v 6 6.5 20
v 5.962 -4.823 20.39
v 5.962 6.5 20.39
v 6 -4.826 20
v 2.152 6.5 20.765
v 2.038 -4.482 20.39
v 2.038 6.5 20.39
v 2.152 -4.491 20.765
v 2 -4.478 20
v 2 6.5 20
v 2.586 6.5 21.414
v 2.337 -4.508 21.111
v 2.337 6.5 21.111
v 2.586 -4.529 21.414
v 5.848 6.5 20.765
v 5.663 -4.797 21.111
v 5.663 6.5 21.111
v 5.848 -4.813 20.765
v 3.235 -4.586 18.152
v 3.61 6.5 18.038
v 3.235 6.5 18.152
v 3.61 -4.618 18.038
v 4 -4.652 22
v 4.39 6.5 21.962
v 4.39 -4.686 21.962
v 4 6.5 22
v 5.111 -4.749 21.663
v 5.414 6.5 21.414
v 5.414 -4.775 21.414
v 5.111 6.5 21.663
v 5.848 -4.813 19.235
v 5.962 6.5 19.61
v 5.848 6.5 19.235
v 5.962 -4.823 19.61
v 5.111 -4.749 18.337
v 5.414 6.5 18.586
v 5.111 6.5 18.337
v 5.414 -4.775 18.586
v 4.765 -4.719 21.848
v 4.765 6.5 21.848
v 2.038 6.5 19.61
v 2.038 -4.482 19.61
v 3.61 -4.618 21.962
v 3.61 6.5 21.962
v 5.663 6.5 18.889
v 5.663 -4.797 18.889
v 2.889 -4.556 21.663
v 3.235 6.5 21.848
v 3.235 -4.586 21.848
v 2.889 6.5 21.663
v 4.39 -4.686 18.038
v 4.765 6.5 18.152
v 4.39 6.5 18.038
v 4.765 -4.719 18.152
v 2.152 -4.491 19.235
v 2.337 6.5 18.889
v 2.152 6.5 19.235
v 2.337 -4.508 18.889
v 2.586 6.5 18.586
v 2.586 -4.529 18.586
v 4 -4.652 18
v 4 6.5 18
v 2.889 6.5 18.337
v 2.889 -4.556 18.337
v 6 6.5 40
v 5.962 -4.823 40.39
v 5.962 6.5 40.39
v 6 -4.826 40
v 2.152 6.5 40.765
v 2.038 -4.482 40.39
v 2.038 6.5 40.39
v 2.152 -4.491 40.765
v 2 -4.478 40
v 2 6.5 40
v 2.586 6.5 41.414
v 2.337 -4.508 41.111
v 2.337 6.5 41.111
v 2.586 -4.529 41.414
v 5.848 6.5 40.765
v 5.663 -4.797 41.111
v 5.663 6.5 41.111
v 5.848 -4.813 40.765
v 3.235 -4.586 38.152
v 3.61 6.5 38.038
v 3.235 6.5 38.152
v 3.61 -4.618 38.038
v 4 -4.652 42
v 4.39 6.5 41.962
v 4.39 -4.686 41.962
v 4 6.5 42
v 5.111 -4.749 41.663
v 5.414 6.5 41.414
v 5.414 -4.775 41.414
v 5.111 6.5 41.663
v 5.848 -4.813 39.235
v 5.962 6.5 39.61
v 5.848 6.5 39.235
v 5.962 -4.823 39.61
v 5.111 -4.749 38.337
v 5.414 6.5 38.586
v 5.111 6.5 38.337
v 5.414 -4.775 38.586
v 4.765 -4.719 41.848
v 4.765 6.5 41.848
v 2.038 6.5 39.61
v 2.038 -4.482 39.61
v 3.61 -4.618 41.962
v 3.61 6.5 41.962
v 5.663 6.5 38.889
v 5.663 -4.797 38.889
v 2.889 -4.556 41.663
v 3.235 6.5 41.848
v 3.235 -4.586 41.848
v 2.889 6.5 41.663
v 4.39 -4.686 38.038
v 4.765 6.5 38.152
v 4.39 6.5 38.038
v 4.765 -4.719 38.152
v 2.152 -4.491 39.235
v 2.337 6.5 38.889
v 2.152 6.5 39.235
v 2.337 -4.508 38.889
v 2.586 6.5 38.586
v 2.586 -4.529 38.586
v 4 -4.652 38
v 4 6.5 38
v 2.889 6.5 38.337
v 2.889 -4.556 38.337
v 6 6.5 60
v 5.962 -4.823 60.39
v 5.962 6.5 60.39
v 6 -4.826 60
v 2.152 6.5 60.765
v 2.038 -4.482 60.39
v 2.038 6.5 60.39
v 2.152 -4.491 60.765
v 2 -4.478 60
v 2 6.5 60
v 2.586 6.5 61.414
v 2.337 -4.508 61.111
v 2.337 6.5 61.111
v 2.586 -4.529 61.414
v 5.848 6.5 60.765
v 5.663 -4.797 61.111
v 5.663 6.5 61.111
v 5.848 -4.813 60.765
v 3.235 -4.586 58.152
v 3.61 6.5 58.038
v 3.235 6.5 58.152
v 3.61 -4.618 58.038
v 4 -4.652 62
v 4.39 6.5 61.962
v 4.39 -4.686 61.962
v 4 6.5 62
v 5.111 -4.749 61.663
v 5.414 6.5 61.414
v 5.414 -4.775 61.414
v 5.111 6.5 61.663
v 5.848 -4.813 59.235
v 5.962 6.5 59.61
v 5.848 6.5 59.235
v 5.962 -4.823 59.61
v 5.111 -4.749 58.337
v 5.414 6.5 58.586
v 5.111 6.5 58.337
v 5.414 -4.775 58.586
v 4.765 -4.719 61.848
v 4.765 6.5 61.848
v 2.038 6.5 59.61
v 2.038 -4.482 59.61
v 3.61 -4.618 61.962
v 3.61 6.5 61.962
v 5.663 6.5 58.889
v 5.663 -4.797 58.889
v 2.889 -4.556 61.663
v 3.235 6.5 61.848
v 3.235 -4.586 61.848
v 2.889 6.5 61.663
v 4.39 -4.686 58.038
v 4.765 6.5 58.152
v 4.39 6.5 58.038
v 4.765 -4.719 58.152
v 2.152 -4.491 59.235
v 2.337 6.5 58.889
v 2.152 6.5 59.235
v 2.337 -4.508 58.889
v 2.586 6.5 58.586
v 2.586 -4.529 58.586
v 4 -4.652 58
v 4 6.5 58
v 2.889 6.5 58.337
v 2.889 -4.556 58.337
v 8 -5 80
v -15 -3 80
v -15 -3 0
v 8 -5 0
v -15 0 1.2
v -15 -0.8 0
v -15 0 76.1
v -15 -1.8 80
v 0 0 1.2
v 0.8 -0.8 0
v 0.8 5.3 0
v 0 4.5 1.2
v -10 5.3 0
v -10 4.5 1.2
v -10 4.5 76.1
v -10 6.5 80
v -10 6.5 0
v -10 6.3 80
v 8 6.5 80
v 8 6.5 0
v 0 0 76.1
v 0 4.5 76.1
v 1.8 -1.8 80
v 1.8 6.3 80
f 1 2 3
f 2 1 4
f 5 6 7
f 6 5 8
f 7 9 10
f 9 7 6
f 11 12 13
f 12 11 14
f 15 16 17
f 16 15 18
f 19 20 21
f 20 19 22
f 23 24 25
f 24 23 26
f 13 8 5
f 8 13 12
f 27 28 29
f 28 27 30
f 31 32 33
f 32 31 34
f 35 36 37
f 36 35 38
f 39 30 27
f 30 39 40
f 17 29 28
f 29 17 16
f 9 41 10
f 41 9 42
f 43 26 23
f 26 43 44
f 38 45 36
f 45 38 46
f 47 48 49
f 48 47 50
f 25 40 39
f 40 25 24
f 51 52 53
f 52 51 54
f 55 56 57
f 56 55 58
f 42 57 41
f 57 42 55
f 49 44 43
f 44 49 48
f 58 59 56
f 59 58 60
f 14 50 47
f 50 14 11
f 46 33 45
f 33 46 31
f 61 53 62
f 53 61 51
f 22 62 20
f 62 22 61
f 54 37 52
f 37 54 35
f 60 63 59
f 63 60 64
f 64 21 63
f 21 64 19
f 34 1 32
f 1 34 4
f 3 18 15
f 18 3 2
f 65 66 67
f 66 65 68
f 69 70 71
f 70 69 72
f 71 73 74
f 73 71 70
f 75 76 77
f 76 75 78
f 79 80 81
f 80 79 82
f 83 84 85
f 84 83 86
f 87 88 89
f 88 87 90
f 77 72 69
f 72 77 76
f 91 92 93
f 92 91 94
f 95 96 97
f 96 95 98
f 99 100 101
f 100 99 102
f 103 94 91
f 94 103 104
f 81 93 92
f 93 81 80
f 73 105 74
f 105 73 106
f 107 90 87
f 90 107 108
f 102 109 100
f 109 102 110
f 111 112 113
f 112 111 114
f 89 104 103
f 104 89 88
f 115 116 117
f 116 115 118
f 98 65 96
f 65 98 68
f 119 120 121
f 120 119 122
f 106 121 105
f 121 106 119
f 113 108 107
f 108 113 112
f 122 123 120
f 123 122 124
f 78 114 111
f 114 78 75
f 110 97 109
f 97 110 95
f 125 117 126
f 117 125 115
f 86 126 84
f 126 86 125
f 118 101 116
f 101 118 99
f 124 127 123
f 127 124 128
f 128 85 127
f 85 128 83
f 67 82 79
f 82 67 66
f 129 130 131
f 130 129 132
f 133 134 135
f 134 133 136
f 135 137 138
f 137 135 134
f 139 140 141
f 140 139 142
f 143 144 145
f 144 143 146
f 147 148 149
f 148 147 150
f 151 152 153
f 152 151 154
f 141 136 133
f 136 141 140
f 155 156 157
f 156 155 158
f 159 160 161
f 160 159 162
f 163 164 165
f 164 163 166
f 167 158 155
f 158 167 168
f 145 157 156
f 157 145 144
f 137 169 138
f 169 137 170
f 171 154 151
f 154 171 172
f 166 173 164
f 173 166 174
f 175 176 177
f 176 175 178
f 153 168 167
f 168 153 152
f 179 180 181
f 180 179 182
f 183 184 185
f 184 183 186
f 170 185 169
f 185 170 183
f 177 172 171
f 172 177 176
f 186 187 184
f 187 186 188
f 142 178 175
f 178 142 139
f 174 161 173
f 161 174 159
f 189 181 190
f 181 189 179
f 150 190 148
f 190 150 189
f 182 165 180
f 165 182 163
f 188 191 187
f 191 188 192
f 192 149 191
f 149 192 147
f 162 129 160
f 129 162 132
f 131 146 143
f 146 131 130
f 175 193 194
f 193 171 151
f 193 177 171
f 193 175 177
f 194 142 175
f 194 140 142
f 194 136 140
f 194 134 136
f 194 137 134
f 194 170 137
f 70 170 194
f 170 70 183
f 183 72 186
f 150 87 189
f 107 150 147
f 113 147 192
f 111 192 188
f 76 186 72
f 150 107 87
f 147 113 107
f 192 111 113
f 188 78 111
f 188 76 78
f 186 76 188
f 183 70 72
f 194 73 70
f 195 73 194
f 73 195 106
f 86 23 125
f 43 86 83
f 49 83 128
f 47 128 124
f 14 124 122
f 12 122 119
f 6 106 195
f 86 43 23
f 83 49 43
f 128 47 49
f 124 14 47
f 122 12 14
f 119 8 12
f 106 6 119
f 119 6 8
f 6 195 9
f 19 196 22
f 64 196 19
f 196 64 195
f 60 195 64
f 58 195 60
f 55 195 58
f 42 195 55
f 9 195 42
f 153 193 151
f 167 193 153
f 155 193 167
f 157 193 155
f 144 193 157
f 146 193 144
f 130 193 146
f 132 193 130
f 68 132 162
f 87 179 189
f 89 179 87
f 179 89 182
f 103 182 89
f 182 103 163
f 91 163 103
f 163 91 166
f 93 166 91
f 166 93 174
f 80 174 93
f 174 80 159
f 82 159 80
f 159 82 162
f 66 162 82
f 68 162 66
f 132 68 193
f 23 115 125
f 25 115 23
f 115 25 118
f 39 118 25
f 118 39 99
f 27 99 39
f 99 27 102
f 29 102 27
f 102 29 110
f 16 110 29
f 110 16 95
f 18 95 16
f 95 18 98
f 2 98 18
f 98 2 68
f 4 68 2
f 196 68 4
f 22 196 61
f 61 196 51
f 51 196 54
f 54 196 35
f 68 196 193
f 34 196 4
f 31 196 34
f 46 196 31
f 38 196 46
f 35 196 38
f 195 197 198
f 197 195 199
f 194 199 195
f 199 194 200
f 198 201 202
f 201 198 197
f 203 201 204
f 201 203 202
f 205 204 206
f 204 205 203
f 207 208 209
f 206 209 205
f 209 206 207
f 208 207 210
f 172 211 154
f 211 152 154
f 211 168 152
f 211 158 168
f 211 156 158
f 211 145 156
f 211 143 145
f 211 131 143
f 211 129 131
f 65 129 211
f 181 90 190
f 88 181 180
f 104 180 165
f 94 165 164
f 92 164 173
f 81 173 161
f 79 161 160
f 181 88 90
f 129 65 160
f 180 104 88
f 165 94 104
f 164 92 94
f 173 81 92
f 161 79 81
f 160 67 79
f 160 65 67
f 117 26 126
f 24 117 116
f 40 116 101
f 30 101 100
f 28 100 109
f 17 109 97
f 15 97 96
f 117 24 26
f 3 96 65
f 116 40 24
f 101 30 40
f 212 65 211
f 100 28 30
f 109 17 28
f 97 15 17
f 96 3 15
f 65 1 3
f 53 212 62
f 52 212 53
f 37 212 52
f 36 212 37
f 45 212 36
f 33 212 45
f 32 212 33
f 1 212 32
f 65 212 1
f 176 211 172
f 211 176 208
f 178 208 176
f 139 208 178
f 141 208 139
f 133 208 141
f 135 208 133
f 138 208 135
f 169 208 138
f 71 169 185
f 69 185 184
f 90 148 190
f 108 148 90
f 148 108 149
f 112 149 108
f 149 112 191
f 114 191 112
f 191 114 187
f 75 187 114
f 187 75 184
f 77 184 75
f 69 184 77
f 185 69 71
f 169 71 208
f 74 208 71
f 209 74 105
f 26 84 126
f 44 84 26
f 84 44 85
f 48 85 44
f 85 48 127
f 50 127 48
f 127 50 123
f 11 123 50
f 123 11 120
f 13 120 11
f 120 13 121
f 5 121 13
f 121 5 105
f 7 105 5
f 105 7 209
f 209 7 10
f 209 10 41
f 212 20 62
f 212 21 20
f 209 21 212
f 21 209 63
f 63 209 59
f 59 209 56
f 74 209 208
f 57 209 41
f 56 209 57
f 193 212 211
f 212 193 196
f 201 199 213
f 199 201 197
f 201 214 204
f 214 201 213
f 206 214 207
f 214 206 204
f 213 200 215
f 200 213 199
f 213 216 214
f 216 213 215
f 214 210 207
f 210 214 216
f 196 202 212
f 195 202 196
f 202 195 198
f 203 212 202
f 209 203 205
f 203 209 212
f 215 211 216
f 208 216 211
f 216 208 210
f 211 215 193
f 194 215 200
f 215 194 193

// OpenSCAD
use <tubemesh.scad>;

boardThickness = 4; // fix
length = 80; // fix
deltaBottom = 0.8; // fix
deltaTop = 1.8; // fix
deltaRatio = 1.5;
right = 0;
bottomSlideWidth = 15;
topSlideWidth = 10;
holderWidth = 8;
tolerance = 0.5;
bottomMinimumThickness = 3;
bottomMaximumThickness = 5;
topThickness = 2;
holeDiameter = 4;
hole1Offset = 20; 
numHoles = 3;

function crossSection(delta=0) =
        [[-holderWidth,-bottomMaximumThickness],
        [bottomSlideWidth,-bottomMinimumThickness],
        [bottomSlideWidth,-delta],
        [-delta,-delta],
        [-delta,boardThickness+tolerance+delta],
        [topSlideWidth,boardThickness+tolerance+delta],
        [topSlideWidth,boardThickness+tolerance+topThickness],
        [-holderWidth,boardThickness+tolerance+topThickness]];

module slide() {
    s0 = crossSection(delta=deltaBottom);
    s1 = crossSection();
    s2 = crossSection(delta=deltaTop);
    tubeMesh([sectionZ(s0,0), sectionZ(s1,deltaBottom*deltaRatio), sectionZ(s1,length-(deltaBottom+deltaTop)*deltaRatio), sectionZ(s2,length)]);
}

render(convexity=2)
mirror([right?0:1,0,0])
difference() {
    slide();
    for (i=[0:numHoles-1]) {
        z = (length-(hole1Offset*2))/(numHoles-1)*i+hole1Offset;
        translate([-holderWidth/2,0,z])
        rotate([90,0,0])
        cylinder(h=100,d=holeDiameter,center=true,$fn=32);
    }
}
